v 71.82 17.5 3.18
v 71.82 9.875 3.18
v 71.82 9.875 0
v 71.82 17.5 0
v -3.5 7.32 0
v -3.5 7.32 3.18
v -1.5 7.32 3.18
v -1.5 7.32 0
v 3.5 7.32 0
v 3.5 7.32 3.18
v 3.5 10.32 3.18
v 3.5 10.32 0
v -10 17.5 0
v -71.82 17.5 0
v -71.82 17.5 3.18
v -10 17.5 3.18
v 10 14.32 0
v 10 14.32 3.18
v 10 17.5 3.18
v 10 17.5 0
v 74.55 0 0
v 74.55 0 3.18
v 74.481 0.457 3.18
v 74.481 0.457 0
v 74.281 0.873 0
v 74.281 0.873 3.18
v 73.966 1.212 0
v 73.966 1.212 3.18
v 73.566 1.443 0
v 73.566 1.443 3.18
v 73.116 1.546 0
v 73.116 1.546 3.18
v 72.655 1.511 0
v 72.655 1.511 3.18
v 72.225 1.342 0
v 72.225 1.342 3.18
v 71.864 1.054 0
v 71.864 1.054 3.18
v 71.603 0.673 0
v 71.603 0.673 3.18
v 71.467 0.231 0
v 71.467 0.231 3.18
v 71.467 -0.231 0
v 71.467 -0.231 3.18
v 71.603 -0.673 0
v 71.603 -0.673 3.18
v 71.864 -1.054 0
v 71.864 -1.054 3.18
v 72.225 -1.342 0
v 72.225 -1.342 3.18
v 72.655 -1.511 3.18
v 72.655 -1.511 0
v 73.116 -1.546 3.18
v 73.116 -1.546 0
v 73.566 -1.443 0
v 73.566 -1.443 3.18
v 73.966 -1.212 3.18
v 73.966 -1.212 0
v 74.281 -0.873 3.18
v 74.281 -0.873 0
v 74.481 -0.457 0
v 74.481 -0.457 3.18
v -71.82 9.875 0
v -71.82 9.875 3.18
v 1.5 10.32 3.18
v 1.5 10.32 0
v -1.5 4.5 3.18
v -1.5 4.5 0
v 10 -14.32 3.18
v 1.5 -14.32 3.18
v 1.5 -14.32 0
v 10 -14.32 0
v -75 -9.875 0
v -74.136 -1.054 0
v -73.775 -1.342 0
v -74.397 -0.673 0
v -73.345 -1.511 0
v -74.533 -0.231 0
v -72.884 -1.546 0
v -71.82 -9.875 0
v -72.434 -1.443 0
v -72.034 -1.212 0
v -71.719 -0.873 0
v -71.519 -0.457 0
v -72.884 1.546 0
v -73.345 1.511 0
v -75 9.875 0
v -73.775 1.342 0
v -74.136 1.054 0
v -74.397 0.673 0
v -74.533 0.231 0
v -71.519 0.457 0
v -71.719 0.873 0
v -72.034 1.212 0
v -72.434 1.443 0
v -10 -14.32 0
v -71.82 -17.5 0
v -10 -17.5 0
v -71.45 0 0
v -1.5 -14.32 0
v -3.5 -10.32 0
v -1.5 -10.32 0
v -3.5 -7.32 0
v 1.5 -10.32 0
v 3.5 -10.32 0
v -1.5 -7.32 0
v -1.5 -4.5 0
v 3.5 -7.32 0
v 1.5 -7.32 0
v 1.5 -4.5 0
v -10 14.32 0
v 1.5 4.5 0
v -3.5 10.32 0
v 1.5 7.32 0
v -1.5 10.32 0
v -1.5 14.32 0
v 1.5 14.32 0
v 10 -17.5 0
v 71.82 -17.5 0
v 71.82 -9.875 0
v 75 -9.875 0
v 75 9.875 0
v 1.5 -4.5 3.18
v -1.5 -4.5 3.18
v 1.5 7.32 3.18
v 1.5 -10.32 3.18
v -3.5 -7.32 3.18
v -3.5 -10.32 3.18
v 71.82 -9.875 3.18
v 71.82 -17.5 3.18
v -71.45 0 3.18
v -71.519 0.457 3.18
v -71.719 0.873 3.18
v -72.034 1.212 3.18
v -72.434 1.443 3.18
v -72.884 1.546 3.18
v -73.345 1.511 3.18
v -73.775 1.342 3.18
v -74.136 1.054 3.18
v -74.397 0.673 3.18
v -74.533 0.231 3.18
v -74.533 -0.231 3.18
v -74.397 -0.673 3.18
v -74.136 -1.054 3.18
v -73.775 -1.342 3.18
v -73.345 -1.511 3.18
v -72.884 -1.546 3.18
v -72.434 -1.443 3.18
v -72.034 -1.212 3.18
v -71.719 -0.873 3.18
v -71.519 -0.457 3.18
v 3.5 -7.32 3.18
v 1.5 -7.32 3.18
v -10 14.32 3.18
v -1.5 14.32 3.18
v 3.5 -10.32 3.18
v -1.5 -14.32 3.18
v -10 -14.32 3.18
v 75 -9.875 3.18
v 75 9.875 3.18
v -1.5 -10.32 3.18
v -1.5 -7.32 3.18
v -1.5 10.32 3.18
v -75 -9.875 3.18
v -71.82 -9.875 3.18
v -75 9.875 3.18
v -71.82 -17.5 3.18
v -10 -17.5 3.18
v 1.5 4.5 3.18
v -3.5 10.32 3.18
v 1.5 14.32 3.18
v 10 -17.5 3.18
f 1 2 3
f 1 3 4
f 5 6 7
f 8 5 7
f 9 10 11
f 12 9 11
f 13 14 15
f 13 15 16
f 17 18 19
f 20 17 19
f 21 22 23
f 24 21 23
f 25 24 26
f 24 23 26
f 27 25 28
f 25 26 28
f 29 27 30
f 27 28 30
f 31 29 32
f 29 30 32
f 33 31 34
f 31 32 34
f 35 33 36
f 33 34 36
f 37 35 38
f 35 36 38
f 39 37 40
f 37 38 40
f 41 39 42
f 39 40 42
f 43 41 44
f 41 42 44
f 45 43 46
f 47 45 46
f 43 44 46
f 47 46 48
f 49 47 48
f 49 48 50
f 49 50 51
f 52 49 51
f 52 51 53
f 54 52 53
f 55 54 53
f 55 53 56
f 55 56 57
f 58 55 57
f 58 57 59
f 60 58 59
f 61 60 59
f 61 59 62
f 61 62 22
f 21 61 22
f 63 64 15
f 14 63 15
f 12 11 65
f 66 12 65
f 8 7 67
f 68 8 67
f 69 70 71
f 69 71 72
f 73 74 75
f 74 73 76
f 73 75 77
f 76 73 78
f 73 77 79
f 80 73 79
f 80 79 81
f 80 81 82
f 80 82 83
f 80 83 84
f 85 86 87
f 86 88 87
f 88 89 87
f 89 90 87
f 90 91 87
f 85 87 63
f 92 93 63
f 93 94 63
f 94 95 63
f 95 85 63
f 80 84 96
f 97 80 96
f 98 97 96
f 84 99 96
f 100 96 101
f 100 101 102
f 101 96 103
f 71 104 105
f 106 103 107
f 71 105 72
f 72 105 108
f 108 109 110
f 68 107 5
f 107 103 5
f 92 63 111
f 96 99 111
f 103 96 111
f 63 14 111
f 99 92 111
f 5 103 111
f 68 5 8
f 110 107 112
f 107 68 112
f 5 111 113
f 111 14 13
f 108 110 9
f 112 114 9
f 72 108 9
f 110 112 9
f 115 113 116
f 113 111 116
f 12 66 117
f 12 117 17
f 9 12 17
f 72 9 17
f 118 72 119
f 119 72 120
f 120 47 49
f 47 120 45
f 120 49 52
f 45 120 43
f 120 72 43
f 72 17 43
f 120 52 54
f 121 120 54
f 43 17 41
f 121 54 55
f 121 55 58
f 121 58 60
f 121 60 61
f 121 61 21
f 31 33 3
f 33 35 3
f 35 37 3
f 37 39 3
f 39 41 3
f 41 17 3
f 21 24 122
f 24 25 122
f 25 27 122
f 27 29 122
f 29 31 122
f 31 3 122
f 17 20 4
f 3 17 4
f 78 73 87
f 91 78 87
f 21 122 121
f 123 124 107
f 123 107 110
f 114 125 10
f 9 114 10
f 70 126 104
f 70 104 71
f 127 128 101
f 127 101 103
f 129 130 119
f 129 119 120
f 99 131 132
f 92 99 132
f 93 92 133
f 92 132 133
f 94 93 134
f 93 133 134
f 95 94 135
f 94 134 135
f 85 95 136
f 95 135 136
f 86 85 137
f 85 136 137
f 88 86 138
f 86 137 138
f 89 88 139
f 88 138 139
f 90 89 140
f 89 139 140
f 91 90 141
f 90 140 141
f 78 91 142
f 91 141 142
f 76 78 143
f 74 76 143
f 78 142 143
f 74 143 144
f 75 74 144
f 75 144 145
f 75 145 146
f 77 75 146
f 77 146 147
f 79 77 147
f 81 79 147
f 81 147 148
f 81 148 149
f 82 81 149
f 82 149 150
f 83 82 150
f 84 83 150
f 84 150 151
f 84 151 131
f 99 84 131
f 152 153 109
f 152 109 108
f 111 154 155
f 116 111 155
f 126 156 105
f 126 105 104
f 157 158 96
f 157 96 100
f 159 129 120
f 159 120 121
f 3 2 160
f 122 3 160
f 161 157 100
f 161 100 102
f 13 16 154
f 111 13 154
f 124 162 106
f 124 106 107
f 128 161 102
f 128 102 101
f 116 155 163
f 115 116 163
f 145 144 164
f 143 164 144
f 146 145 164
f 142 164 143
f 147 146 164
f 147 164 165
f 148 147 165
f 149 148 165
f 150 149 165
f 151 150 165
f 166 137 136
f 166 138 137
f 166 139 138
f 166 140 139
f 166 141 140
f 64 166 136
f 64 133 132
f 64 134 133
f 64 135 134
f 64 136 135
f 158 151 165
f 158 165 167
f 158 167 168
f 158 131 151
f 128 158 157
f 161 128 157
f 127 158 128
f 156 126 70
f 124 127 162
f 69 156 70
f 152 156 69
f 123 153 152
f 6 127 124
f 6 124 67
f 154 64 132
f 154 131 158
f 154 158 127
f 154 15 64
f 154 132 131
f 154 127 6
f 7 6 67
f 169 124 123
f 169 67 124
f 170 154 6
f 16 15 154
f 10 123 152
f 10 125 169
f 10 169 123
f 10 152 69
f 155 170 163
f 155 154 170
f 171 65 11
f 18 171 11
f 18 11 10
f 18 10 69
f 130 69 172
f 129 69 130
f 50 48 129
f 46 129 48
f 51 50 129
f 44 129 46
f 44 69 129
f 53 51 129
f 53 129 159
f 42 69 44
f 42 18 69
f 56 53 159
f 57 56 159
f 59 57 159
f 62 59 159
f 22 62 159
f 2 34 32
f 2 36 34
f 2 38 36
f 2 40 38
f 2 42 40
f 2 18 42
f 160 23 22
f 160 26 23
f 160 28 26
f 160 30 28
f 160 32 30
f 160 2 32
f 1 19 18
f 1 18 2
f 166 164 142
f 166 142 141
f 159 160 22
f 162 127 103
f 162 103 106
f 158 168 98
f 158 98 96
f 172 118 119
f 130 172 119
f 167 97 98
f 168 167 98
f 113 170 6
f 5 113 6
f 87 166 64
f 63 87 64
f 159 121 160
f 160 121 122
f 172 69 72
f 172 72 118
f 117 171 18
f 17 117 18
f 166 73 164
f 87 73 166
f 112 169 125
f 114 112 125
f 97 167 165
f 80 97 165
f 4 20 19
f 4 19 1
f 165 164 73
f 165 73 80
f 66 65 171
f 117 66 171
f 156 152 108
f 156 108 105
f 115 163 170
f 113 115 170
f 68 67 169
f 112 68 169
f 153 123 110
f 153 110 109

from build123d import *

# Parameters (mm, degrees)
SKETCH1_W           = 150
SKETCH1_H           = 35
BOSS_EXTRUDE1_DEPTH = 3.18
SKETCH2_R           = 1.55
SKETCH2_W           = 3.18
SKETCH2_H           = 7.625
CUT_EXTRUDE1_DEPTH  = 78.080233523


with BuildPart() as part:
    # Sketch1 → Boss-Extrude1 (new body)
    with BuildSketch(Plane.XY):
        Rectangle(SKETCH1_W, SKETCH1_H)
    extrude(amount=BOSS_EXTRUDE1_DEPTH)

    # Sketch2 → Cut-Extrude1 (cut, through all)
    with BuildSketch(Plane.XY.offset(3.18)):
        with Locations((-73, 0)):
            Circle(SKETCH2_R)
        with Locations((73, 0)):
            Circle(SKETCH2_R)
        Polygon((1.5, 14.32), (10, 14.32), (10, 17.5), (-10, 17.5), (-10, 14.32), (-1.5, 14.32), (-1.5, 10.32), (-3.5, 10.32), (-3.5, 7.32), (-1.5, 7.32), (-1.5, 4.5), (1.5, 4.5), (1.5, 7.32), (3.5, 7.32), (3.5, 10.32), (1.5, 10.32), align=None)
        Polygon((-1.5, -7.32), (-1.5, -4.5), (1.5, -4.5), (1.5, -7.32), (3.5, -7.32), (3.5, -10.32), (1.5, -10.32), (1.5, -14.32), (10, -14.32), (10, -17.5), (-10, -17.5), (-10, -14.32), (-1.5, -14.32), (-1.5, -10.32), (-3.5, -10.32), (-3.5, -7.32), align=None)
        with Locations((73.41, -13.6875)):
            Rectangle(SKETCH2_W, SKETCH2_H)
        with Locations((-73.41, 13.6875)):
            Rectangle(SKETCH2_W, SKETCH2_H)
        with Locations((-73.41, -13.6875)):
            Rectangle(SKETCH2_W, SKETCH2_H)
        with Locations((73.41, 13.6875)):
            Rectangle(SKETCH2_W, SKETCH2_H)
    extrude(amount=-CUT_EXTRUDE1_DEPTH, mode=Mode.SUBTRACT)


solid = part.part
